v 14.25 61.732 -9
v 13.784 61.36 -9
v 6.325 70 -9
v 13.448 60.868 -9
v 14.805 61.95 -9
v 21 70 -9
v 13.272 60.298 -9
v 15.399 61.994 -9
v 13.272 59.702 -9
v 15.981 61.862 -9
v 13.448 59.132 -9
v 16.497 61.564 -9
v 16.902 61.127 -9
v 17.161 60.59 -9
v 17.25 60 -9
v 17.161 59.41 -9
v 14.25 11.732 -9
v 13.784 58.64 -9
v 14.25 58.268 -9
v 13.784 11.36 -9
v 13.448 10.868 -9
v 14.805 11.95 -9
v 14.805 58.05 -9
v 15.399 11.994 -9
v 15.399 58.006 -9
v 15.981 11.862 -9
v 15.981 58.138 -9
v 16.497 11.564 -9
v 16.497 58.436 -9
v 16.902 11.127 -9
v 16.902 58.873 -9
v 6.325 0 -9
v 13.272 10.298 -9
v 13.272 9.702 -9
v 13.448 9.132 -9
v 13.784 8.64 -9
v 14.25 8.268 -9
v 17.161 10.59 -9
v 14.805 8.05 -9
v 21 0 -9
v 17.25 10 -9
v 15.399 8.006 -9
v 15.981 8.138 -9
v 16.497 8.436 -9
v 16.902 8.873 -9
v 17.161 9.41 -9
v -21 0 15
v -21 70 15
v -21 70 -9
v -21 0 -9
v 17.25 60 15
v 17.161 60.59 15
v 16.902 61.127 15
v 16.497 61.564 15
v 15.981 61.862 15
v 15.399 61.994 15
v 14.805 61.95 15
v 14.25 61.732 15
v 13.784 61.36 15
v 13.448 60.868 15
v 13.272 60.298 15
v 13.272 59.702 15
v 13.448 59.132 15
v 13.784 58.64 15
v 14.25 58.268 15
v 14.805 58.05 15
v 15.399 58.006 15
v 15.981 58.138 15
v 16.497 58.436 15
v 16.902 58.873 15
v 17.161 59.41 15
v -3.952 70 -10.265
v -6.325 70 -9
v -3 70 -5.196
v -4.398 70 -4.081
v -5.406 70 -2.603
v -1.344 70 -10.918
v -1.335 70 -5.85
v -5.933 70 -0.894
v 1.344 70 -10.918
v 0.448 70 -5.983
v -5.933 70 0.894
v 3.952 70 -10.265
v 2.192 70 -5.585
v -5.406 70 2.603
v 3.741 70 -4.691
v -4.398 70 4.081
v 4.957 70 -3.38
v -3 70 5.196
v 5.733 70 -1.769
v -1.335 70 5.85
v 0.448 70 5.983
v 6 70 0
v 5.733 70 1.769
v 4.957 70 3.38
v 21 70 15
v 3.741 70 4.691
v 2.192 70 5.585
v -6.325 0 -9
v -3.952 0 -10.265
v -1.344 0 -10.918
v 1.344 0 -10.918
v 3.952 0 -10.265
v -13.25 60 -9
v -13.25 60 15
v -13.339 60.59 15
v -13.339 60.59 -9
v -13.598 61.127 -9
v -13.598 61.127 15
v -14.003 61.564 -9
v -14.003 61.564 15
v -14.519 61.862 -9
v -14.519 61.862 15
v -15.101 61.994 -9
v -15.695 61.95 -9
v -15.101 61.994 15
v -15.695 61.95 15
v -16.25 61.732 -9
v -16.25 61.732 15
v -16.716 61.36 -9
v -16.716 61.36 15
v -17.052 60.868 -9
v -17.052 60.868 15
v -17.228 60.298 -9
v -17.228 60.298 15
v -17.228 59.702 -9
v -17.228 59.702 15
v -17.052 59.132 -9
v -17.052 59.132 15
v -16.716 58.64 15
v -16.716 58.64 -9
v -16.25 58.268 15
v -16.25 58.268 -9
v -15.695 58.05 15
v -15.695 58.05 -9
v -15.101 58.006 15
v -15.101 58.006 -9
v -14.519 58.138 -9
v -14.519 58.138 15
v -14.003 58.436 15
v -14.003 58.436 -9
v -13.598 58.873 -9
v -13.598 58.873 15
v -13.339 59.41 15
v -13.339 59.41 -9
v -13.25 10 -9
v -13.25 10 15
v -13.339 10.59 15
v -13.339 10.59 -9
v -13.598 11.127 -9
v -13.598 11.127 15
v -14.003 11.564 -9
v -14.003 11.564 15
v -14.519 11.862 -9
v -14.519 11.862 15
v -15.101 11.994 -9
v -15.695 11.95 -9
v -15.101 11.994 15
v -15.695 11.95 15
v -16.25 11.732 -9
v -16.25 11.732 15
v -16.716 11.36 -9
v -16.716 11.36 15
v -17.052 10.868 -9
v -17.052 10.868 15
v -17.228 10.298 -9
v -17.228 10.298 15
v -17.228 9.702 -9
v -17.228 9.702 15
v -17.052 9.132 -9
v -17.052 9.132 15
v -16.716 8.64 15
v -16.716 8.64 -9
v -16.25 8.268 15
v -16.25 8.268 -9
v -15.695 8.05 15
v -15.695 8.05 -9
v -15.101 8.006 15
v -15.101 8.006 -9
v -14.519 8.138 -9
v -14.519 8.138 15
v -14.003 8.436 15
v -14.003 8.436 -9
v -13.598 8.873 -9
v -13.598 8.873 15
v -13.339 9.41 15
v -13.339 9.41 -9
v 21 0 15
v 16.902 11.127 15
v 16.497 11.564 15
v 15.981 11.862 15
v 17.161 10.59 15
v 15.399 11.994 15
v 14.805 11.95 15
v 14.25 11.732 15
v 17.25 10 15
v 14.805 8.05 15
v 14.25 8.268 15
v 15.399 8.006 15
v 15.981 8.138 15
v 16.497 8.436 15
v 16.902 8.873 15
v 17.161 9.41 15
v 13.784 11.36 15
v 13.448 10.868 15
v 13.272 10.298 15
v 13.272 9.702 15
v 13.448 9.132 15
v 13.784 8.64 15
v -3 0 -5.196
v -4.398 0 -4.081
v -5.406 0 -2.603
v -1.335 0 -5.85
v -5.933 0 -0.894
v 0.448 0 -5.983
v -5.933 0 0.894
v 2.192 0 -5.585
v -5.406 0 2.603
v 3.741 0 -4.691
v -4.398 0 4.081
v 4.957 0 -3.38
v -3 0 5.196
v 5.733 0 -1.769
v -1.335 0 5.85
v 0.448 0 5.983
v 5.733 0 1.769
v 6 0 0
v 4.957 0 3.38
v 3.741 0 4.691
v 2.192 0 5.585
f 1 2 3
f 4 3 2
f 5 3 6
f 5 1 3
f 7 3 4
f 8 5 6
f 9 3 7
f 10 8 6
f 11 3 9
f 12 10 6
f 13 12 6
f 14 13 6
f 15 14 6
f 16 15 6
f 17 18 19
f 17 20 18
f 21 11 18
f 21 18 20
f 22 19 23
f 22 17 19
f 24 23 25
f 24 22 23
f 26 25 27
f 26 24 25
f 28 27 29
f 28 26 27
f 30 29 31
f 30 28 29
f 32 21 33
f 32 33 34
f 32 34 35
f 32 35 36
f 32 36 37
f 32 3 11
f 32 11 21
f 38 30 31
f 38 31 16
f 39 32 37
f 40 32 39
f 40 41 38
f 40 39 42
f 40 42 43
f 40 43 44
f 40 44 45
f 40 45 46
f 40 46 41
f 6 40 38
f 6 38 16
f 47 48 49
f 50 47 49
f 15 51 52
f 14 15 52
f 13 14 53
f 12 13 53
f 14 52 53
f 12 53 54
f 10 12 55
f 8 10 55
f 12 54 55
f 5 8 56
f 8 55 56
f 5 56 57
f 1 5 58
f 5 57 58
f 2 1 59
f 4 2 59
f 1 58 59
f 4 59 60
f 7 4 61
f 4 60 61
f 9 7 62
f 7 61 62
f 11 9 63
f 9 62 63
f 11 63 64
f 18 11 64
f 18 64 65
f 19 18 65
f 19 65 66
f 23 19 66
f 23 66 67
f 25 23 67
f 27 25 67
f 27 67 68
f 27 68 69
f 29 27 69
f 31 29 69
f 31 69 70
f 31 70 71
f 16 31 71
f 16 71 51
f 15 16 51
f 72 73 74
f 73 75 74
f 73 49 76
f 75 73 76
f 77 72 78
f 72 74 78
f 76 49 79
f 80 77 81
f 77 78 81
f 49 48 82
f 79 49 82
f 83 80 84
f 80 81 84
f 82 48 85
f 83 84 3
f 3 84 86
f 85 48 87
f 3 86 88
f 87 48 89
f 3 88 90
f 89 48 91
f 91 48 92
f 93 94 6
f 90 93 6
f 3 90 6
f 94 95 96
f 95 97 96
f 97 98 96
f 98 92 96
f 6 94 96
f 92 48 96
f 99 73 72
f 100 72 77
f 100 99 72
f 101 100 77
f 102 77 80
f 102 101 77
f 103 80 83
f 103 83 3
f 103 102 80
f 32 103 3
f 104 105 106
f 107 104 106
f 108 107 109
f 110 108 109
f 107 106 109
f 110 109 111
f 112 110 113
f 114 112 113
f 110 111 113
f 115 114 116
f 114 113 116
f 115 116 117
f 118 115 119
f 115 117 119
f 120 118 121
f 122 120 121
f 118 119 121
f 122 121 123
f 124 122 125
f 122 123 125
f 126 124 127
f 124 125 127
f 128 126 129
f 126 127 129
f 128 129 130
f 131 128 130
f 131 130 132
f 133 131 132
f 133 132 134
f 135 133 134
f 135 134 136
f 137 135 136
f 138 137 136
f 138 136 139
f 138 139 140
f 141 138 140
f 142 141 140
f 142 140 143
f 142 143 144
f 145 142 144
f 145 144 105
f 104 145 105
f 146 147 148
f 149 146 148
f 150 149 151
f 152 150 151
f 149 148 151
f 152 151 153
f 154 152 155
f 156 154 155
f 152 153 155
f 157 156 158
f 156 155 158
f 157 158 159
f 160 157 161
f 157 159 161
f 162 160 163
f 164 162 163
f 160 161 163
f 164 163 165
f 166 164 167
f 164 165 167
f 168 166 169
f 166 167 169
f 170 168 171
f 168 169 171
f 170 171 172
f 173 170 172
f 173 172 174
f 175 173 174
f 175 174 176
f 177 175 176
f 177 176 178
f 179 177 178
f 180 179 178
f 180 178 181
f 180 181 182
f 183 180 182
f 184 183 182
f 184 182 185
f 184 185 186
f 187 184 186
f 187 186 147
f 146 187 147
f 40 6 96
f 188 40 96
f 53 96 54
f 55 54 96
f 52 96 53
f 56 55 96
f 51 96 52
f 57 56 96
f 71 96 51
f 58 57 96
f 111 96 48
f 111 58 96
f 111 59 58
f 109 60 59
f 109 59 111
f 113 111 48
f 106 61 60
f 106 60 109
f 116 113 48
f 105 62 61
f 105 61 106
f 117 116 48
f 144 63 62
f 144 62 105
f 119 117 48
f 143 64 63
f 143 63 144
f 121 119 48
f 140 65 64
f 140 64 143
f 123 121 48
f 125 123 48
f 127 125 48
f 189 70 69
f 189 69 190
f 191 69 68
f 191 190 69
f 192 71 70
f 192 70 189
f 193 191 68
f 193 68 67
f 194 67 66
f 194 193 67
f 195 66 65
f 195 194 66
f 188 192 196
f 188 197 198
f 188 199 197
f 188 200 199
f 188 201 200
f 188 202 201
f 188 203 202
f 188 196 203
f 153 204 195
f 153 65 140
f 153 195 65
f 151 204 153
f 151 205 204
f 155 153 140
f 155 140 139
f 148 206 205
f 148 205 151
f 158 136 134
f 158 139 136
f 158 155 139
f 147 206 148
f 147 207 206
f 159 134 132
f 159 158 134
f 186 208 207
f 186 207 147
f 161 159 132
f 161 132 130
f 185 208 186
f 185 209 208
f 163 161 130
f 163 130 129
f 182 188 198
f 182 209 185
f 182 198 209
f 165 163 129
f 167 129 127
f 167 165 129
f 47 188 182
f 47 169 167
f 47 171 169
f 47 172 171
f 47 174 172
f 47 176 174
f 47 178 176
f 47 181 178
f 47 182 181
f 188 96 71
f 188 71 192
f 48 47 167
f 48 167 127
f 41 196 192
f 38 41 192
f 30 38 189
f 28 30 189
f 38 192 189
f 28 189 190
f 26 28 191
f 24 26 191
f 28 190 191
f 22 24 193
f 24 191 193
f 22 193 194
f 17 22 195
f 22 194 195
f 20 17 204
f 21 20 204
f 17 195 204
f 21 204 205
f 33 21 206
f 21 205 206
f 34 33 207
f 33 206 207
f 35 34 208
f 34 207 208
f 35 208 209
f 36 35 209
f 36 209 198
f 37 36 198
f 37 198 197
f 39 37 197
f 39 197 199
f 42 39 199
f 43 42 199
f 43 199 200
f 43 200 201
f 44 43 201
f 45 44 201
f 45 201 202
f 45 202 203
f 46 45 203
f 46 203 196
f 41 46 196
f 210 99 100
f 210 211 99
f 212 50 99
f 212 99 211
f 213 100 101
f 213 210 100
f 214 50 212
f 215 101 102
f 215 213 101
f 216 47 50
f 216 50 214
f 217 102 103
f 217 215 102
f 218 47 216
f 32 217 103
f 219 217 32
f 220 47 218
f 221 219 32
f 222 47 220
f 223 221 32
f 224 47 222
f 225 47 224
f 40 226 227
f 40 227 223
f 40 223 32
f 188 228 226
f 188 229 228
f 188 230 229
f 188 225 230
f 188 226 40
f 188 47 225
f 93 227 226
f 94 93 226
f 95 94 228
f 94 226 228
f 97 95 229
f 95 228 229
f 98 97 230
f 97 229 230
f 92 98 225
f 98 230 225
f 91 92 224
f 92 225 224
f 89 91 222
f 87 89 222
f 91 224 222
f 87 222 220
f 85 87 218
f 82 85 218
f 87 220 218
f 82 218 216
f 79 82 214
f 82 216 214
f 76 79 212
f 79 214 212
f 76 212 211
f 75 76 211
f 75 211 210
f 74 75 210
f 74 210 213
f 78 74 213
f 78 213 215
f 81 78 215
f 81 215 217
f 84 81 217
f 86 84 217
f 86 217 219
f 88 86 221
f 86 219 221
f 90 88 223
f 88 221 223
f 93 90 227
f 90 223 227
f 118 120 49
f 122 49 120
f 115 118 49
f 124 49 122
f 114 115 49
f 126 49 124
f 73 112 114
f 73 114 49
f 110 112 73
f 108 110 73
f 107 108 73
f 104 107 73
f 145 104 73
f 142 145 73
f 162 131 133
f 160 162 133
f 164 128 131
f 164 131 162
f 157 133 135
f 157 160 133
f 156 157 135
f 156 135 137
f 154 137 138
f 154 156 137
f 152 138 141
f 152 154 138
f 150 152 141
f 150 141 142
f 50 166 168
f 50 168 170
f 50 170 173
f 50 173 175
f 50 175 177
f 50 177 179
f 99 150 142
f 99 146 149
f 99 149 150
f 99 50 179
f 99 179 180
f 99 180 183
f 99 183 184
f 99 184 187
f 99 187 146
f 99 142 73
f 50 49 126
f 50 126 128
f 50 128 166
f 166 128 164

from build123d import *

# Parameters (mm, degrees)
F0_R     = 6
F1_DEPTH = 70
F2_R     = 2
F3_DEPTH = 26.001


with BuildPart() as f1:
    # F0 (on Front) → F1 (new body)
    with BuildSketch(Plane.XZ):
        with BuildLine():
            Line((21, 15), (-21, 15))
            Line((-21, 15), (-21, -9))
            Line((-21, -9), (-6.324555, -9))
            ThreePointArc((-6.324555, -9), (0, -11), (6.324555, -9))
            Line((6.324555, -9), (21, -9))
            Line((21, -9), (21, 15))
        make_face()
        Circle(F0_R, mode=Mode.SUBTRACT)
    extrude(amount=-F1_DEPTH)

    # F2 (on face) → F3 (cut, through all)
    with BuildSketch(Plane.XY.offset(15)):
        with Locations((-15.25, 10)):
            Circle(F2_R)
        with Locations((-15.25, 60)):
            Circle(F2_R)
        with Locations((15.25, 60)):
            Circle(F2_R)
        with Locations((15.25, 10)):
            Circle(F2_R)
    extrude(amount=-F3_DEPTH, mode=Mode.SUBTRACT)


solid = f1.part
